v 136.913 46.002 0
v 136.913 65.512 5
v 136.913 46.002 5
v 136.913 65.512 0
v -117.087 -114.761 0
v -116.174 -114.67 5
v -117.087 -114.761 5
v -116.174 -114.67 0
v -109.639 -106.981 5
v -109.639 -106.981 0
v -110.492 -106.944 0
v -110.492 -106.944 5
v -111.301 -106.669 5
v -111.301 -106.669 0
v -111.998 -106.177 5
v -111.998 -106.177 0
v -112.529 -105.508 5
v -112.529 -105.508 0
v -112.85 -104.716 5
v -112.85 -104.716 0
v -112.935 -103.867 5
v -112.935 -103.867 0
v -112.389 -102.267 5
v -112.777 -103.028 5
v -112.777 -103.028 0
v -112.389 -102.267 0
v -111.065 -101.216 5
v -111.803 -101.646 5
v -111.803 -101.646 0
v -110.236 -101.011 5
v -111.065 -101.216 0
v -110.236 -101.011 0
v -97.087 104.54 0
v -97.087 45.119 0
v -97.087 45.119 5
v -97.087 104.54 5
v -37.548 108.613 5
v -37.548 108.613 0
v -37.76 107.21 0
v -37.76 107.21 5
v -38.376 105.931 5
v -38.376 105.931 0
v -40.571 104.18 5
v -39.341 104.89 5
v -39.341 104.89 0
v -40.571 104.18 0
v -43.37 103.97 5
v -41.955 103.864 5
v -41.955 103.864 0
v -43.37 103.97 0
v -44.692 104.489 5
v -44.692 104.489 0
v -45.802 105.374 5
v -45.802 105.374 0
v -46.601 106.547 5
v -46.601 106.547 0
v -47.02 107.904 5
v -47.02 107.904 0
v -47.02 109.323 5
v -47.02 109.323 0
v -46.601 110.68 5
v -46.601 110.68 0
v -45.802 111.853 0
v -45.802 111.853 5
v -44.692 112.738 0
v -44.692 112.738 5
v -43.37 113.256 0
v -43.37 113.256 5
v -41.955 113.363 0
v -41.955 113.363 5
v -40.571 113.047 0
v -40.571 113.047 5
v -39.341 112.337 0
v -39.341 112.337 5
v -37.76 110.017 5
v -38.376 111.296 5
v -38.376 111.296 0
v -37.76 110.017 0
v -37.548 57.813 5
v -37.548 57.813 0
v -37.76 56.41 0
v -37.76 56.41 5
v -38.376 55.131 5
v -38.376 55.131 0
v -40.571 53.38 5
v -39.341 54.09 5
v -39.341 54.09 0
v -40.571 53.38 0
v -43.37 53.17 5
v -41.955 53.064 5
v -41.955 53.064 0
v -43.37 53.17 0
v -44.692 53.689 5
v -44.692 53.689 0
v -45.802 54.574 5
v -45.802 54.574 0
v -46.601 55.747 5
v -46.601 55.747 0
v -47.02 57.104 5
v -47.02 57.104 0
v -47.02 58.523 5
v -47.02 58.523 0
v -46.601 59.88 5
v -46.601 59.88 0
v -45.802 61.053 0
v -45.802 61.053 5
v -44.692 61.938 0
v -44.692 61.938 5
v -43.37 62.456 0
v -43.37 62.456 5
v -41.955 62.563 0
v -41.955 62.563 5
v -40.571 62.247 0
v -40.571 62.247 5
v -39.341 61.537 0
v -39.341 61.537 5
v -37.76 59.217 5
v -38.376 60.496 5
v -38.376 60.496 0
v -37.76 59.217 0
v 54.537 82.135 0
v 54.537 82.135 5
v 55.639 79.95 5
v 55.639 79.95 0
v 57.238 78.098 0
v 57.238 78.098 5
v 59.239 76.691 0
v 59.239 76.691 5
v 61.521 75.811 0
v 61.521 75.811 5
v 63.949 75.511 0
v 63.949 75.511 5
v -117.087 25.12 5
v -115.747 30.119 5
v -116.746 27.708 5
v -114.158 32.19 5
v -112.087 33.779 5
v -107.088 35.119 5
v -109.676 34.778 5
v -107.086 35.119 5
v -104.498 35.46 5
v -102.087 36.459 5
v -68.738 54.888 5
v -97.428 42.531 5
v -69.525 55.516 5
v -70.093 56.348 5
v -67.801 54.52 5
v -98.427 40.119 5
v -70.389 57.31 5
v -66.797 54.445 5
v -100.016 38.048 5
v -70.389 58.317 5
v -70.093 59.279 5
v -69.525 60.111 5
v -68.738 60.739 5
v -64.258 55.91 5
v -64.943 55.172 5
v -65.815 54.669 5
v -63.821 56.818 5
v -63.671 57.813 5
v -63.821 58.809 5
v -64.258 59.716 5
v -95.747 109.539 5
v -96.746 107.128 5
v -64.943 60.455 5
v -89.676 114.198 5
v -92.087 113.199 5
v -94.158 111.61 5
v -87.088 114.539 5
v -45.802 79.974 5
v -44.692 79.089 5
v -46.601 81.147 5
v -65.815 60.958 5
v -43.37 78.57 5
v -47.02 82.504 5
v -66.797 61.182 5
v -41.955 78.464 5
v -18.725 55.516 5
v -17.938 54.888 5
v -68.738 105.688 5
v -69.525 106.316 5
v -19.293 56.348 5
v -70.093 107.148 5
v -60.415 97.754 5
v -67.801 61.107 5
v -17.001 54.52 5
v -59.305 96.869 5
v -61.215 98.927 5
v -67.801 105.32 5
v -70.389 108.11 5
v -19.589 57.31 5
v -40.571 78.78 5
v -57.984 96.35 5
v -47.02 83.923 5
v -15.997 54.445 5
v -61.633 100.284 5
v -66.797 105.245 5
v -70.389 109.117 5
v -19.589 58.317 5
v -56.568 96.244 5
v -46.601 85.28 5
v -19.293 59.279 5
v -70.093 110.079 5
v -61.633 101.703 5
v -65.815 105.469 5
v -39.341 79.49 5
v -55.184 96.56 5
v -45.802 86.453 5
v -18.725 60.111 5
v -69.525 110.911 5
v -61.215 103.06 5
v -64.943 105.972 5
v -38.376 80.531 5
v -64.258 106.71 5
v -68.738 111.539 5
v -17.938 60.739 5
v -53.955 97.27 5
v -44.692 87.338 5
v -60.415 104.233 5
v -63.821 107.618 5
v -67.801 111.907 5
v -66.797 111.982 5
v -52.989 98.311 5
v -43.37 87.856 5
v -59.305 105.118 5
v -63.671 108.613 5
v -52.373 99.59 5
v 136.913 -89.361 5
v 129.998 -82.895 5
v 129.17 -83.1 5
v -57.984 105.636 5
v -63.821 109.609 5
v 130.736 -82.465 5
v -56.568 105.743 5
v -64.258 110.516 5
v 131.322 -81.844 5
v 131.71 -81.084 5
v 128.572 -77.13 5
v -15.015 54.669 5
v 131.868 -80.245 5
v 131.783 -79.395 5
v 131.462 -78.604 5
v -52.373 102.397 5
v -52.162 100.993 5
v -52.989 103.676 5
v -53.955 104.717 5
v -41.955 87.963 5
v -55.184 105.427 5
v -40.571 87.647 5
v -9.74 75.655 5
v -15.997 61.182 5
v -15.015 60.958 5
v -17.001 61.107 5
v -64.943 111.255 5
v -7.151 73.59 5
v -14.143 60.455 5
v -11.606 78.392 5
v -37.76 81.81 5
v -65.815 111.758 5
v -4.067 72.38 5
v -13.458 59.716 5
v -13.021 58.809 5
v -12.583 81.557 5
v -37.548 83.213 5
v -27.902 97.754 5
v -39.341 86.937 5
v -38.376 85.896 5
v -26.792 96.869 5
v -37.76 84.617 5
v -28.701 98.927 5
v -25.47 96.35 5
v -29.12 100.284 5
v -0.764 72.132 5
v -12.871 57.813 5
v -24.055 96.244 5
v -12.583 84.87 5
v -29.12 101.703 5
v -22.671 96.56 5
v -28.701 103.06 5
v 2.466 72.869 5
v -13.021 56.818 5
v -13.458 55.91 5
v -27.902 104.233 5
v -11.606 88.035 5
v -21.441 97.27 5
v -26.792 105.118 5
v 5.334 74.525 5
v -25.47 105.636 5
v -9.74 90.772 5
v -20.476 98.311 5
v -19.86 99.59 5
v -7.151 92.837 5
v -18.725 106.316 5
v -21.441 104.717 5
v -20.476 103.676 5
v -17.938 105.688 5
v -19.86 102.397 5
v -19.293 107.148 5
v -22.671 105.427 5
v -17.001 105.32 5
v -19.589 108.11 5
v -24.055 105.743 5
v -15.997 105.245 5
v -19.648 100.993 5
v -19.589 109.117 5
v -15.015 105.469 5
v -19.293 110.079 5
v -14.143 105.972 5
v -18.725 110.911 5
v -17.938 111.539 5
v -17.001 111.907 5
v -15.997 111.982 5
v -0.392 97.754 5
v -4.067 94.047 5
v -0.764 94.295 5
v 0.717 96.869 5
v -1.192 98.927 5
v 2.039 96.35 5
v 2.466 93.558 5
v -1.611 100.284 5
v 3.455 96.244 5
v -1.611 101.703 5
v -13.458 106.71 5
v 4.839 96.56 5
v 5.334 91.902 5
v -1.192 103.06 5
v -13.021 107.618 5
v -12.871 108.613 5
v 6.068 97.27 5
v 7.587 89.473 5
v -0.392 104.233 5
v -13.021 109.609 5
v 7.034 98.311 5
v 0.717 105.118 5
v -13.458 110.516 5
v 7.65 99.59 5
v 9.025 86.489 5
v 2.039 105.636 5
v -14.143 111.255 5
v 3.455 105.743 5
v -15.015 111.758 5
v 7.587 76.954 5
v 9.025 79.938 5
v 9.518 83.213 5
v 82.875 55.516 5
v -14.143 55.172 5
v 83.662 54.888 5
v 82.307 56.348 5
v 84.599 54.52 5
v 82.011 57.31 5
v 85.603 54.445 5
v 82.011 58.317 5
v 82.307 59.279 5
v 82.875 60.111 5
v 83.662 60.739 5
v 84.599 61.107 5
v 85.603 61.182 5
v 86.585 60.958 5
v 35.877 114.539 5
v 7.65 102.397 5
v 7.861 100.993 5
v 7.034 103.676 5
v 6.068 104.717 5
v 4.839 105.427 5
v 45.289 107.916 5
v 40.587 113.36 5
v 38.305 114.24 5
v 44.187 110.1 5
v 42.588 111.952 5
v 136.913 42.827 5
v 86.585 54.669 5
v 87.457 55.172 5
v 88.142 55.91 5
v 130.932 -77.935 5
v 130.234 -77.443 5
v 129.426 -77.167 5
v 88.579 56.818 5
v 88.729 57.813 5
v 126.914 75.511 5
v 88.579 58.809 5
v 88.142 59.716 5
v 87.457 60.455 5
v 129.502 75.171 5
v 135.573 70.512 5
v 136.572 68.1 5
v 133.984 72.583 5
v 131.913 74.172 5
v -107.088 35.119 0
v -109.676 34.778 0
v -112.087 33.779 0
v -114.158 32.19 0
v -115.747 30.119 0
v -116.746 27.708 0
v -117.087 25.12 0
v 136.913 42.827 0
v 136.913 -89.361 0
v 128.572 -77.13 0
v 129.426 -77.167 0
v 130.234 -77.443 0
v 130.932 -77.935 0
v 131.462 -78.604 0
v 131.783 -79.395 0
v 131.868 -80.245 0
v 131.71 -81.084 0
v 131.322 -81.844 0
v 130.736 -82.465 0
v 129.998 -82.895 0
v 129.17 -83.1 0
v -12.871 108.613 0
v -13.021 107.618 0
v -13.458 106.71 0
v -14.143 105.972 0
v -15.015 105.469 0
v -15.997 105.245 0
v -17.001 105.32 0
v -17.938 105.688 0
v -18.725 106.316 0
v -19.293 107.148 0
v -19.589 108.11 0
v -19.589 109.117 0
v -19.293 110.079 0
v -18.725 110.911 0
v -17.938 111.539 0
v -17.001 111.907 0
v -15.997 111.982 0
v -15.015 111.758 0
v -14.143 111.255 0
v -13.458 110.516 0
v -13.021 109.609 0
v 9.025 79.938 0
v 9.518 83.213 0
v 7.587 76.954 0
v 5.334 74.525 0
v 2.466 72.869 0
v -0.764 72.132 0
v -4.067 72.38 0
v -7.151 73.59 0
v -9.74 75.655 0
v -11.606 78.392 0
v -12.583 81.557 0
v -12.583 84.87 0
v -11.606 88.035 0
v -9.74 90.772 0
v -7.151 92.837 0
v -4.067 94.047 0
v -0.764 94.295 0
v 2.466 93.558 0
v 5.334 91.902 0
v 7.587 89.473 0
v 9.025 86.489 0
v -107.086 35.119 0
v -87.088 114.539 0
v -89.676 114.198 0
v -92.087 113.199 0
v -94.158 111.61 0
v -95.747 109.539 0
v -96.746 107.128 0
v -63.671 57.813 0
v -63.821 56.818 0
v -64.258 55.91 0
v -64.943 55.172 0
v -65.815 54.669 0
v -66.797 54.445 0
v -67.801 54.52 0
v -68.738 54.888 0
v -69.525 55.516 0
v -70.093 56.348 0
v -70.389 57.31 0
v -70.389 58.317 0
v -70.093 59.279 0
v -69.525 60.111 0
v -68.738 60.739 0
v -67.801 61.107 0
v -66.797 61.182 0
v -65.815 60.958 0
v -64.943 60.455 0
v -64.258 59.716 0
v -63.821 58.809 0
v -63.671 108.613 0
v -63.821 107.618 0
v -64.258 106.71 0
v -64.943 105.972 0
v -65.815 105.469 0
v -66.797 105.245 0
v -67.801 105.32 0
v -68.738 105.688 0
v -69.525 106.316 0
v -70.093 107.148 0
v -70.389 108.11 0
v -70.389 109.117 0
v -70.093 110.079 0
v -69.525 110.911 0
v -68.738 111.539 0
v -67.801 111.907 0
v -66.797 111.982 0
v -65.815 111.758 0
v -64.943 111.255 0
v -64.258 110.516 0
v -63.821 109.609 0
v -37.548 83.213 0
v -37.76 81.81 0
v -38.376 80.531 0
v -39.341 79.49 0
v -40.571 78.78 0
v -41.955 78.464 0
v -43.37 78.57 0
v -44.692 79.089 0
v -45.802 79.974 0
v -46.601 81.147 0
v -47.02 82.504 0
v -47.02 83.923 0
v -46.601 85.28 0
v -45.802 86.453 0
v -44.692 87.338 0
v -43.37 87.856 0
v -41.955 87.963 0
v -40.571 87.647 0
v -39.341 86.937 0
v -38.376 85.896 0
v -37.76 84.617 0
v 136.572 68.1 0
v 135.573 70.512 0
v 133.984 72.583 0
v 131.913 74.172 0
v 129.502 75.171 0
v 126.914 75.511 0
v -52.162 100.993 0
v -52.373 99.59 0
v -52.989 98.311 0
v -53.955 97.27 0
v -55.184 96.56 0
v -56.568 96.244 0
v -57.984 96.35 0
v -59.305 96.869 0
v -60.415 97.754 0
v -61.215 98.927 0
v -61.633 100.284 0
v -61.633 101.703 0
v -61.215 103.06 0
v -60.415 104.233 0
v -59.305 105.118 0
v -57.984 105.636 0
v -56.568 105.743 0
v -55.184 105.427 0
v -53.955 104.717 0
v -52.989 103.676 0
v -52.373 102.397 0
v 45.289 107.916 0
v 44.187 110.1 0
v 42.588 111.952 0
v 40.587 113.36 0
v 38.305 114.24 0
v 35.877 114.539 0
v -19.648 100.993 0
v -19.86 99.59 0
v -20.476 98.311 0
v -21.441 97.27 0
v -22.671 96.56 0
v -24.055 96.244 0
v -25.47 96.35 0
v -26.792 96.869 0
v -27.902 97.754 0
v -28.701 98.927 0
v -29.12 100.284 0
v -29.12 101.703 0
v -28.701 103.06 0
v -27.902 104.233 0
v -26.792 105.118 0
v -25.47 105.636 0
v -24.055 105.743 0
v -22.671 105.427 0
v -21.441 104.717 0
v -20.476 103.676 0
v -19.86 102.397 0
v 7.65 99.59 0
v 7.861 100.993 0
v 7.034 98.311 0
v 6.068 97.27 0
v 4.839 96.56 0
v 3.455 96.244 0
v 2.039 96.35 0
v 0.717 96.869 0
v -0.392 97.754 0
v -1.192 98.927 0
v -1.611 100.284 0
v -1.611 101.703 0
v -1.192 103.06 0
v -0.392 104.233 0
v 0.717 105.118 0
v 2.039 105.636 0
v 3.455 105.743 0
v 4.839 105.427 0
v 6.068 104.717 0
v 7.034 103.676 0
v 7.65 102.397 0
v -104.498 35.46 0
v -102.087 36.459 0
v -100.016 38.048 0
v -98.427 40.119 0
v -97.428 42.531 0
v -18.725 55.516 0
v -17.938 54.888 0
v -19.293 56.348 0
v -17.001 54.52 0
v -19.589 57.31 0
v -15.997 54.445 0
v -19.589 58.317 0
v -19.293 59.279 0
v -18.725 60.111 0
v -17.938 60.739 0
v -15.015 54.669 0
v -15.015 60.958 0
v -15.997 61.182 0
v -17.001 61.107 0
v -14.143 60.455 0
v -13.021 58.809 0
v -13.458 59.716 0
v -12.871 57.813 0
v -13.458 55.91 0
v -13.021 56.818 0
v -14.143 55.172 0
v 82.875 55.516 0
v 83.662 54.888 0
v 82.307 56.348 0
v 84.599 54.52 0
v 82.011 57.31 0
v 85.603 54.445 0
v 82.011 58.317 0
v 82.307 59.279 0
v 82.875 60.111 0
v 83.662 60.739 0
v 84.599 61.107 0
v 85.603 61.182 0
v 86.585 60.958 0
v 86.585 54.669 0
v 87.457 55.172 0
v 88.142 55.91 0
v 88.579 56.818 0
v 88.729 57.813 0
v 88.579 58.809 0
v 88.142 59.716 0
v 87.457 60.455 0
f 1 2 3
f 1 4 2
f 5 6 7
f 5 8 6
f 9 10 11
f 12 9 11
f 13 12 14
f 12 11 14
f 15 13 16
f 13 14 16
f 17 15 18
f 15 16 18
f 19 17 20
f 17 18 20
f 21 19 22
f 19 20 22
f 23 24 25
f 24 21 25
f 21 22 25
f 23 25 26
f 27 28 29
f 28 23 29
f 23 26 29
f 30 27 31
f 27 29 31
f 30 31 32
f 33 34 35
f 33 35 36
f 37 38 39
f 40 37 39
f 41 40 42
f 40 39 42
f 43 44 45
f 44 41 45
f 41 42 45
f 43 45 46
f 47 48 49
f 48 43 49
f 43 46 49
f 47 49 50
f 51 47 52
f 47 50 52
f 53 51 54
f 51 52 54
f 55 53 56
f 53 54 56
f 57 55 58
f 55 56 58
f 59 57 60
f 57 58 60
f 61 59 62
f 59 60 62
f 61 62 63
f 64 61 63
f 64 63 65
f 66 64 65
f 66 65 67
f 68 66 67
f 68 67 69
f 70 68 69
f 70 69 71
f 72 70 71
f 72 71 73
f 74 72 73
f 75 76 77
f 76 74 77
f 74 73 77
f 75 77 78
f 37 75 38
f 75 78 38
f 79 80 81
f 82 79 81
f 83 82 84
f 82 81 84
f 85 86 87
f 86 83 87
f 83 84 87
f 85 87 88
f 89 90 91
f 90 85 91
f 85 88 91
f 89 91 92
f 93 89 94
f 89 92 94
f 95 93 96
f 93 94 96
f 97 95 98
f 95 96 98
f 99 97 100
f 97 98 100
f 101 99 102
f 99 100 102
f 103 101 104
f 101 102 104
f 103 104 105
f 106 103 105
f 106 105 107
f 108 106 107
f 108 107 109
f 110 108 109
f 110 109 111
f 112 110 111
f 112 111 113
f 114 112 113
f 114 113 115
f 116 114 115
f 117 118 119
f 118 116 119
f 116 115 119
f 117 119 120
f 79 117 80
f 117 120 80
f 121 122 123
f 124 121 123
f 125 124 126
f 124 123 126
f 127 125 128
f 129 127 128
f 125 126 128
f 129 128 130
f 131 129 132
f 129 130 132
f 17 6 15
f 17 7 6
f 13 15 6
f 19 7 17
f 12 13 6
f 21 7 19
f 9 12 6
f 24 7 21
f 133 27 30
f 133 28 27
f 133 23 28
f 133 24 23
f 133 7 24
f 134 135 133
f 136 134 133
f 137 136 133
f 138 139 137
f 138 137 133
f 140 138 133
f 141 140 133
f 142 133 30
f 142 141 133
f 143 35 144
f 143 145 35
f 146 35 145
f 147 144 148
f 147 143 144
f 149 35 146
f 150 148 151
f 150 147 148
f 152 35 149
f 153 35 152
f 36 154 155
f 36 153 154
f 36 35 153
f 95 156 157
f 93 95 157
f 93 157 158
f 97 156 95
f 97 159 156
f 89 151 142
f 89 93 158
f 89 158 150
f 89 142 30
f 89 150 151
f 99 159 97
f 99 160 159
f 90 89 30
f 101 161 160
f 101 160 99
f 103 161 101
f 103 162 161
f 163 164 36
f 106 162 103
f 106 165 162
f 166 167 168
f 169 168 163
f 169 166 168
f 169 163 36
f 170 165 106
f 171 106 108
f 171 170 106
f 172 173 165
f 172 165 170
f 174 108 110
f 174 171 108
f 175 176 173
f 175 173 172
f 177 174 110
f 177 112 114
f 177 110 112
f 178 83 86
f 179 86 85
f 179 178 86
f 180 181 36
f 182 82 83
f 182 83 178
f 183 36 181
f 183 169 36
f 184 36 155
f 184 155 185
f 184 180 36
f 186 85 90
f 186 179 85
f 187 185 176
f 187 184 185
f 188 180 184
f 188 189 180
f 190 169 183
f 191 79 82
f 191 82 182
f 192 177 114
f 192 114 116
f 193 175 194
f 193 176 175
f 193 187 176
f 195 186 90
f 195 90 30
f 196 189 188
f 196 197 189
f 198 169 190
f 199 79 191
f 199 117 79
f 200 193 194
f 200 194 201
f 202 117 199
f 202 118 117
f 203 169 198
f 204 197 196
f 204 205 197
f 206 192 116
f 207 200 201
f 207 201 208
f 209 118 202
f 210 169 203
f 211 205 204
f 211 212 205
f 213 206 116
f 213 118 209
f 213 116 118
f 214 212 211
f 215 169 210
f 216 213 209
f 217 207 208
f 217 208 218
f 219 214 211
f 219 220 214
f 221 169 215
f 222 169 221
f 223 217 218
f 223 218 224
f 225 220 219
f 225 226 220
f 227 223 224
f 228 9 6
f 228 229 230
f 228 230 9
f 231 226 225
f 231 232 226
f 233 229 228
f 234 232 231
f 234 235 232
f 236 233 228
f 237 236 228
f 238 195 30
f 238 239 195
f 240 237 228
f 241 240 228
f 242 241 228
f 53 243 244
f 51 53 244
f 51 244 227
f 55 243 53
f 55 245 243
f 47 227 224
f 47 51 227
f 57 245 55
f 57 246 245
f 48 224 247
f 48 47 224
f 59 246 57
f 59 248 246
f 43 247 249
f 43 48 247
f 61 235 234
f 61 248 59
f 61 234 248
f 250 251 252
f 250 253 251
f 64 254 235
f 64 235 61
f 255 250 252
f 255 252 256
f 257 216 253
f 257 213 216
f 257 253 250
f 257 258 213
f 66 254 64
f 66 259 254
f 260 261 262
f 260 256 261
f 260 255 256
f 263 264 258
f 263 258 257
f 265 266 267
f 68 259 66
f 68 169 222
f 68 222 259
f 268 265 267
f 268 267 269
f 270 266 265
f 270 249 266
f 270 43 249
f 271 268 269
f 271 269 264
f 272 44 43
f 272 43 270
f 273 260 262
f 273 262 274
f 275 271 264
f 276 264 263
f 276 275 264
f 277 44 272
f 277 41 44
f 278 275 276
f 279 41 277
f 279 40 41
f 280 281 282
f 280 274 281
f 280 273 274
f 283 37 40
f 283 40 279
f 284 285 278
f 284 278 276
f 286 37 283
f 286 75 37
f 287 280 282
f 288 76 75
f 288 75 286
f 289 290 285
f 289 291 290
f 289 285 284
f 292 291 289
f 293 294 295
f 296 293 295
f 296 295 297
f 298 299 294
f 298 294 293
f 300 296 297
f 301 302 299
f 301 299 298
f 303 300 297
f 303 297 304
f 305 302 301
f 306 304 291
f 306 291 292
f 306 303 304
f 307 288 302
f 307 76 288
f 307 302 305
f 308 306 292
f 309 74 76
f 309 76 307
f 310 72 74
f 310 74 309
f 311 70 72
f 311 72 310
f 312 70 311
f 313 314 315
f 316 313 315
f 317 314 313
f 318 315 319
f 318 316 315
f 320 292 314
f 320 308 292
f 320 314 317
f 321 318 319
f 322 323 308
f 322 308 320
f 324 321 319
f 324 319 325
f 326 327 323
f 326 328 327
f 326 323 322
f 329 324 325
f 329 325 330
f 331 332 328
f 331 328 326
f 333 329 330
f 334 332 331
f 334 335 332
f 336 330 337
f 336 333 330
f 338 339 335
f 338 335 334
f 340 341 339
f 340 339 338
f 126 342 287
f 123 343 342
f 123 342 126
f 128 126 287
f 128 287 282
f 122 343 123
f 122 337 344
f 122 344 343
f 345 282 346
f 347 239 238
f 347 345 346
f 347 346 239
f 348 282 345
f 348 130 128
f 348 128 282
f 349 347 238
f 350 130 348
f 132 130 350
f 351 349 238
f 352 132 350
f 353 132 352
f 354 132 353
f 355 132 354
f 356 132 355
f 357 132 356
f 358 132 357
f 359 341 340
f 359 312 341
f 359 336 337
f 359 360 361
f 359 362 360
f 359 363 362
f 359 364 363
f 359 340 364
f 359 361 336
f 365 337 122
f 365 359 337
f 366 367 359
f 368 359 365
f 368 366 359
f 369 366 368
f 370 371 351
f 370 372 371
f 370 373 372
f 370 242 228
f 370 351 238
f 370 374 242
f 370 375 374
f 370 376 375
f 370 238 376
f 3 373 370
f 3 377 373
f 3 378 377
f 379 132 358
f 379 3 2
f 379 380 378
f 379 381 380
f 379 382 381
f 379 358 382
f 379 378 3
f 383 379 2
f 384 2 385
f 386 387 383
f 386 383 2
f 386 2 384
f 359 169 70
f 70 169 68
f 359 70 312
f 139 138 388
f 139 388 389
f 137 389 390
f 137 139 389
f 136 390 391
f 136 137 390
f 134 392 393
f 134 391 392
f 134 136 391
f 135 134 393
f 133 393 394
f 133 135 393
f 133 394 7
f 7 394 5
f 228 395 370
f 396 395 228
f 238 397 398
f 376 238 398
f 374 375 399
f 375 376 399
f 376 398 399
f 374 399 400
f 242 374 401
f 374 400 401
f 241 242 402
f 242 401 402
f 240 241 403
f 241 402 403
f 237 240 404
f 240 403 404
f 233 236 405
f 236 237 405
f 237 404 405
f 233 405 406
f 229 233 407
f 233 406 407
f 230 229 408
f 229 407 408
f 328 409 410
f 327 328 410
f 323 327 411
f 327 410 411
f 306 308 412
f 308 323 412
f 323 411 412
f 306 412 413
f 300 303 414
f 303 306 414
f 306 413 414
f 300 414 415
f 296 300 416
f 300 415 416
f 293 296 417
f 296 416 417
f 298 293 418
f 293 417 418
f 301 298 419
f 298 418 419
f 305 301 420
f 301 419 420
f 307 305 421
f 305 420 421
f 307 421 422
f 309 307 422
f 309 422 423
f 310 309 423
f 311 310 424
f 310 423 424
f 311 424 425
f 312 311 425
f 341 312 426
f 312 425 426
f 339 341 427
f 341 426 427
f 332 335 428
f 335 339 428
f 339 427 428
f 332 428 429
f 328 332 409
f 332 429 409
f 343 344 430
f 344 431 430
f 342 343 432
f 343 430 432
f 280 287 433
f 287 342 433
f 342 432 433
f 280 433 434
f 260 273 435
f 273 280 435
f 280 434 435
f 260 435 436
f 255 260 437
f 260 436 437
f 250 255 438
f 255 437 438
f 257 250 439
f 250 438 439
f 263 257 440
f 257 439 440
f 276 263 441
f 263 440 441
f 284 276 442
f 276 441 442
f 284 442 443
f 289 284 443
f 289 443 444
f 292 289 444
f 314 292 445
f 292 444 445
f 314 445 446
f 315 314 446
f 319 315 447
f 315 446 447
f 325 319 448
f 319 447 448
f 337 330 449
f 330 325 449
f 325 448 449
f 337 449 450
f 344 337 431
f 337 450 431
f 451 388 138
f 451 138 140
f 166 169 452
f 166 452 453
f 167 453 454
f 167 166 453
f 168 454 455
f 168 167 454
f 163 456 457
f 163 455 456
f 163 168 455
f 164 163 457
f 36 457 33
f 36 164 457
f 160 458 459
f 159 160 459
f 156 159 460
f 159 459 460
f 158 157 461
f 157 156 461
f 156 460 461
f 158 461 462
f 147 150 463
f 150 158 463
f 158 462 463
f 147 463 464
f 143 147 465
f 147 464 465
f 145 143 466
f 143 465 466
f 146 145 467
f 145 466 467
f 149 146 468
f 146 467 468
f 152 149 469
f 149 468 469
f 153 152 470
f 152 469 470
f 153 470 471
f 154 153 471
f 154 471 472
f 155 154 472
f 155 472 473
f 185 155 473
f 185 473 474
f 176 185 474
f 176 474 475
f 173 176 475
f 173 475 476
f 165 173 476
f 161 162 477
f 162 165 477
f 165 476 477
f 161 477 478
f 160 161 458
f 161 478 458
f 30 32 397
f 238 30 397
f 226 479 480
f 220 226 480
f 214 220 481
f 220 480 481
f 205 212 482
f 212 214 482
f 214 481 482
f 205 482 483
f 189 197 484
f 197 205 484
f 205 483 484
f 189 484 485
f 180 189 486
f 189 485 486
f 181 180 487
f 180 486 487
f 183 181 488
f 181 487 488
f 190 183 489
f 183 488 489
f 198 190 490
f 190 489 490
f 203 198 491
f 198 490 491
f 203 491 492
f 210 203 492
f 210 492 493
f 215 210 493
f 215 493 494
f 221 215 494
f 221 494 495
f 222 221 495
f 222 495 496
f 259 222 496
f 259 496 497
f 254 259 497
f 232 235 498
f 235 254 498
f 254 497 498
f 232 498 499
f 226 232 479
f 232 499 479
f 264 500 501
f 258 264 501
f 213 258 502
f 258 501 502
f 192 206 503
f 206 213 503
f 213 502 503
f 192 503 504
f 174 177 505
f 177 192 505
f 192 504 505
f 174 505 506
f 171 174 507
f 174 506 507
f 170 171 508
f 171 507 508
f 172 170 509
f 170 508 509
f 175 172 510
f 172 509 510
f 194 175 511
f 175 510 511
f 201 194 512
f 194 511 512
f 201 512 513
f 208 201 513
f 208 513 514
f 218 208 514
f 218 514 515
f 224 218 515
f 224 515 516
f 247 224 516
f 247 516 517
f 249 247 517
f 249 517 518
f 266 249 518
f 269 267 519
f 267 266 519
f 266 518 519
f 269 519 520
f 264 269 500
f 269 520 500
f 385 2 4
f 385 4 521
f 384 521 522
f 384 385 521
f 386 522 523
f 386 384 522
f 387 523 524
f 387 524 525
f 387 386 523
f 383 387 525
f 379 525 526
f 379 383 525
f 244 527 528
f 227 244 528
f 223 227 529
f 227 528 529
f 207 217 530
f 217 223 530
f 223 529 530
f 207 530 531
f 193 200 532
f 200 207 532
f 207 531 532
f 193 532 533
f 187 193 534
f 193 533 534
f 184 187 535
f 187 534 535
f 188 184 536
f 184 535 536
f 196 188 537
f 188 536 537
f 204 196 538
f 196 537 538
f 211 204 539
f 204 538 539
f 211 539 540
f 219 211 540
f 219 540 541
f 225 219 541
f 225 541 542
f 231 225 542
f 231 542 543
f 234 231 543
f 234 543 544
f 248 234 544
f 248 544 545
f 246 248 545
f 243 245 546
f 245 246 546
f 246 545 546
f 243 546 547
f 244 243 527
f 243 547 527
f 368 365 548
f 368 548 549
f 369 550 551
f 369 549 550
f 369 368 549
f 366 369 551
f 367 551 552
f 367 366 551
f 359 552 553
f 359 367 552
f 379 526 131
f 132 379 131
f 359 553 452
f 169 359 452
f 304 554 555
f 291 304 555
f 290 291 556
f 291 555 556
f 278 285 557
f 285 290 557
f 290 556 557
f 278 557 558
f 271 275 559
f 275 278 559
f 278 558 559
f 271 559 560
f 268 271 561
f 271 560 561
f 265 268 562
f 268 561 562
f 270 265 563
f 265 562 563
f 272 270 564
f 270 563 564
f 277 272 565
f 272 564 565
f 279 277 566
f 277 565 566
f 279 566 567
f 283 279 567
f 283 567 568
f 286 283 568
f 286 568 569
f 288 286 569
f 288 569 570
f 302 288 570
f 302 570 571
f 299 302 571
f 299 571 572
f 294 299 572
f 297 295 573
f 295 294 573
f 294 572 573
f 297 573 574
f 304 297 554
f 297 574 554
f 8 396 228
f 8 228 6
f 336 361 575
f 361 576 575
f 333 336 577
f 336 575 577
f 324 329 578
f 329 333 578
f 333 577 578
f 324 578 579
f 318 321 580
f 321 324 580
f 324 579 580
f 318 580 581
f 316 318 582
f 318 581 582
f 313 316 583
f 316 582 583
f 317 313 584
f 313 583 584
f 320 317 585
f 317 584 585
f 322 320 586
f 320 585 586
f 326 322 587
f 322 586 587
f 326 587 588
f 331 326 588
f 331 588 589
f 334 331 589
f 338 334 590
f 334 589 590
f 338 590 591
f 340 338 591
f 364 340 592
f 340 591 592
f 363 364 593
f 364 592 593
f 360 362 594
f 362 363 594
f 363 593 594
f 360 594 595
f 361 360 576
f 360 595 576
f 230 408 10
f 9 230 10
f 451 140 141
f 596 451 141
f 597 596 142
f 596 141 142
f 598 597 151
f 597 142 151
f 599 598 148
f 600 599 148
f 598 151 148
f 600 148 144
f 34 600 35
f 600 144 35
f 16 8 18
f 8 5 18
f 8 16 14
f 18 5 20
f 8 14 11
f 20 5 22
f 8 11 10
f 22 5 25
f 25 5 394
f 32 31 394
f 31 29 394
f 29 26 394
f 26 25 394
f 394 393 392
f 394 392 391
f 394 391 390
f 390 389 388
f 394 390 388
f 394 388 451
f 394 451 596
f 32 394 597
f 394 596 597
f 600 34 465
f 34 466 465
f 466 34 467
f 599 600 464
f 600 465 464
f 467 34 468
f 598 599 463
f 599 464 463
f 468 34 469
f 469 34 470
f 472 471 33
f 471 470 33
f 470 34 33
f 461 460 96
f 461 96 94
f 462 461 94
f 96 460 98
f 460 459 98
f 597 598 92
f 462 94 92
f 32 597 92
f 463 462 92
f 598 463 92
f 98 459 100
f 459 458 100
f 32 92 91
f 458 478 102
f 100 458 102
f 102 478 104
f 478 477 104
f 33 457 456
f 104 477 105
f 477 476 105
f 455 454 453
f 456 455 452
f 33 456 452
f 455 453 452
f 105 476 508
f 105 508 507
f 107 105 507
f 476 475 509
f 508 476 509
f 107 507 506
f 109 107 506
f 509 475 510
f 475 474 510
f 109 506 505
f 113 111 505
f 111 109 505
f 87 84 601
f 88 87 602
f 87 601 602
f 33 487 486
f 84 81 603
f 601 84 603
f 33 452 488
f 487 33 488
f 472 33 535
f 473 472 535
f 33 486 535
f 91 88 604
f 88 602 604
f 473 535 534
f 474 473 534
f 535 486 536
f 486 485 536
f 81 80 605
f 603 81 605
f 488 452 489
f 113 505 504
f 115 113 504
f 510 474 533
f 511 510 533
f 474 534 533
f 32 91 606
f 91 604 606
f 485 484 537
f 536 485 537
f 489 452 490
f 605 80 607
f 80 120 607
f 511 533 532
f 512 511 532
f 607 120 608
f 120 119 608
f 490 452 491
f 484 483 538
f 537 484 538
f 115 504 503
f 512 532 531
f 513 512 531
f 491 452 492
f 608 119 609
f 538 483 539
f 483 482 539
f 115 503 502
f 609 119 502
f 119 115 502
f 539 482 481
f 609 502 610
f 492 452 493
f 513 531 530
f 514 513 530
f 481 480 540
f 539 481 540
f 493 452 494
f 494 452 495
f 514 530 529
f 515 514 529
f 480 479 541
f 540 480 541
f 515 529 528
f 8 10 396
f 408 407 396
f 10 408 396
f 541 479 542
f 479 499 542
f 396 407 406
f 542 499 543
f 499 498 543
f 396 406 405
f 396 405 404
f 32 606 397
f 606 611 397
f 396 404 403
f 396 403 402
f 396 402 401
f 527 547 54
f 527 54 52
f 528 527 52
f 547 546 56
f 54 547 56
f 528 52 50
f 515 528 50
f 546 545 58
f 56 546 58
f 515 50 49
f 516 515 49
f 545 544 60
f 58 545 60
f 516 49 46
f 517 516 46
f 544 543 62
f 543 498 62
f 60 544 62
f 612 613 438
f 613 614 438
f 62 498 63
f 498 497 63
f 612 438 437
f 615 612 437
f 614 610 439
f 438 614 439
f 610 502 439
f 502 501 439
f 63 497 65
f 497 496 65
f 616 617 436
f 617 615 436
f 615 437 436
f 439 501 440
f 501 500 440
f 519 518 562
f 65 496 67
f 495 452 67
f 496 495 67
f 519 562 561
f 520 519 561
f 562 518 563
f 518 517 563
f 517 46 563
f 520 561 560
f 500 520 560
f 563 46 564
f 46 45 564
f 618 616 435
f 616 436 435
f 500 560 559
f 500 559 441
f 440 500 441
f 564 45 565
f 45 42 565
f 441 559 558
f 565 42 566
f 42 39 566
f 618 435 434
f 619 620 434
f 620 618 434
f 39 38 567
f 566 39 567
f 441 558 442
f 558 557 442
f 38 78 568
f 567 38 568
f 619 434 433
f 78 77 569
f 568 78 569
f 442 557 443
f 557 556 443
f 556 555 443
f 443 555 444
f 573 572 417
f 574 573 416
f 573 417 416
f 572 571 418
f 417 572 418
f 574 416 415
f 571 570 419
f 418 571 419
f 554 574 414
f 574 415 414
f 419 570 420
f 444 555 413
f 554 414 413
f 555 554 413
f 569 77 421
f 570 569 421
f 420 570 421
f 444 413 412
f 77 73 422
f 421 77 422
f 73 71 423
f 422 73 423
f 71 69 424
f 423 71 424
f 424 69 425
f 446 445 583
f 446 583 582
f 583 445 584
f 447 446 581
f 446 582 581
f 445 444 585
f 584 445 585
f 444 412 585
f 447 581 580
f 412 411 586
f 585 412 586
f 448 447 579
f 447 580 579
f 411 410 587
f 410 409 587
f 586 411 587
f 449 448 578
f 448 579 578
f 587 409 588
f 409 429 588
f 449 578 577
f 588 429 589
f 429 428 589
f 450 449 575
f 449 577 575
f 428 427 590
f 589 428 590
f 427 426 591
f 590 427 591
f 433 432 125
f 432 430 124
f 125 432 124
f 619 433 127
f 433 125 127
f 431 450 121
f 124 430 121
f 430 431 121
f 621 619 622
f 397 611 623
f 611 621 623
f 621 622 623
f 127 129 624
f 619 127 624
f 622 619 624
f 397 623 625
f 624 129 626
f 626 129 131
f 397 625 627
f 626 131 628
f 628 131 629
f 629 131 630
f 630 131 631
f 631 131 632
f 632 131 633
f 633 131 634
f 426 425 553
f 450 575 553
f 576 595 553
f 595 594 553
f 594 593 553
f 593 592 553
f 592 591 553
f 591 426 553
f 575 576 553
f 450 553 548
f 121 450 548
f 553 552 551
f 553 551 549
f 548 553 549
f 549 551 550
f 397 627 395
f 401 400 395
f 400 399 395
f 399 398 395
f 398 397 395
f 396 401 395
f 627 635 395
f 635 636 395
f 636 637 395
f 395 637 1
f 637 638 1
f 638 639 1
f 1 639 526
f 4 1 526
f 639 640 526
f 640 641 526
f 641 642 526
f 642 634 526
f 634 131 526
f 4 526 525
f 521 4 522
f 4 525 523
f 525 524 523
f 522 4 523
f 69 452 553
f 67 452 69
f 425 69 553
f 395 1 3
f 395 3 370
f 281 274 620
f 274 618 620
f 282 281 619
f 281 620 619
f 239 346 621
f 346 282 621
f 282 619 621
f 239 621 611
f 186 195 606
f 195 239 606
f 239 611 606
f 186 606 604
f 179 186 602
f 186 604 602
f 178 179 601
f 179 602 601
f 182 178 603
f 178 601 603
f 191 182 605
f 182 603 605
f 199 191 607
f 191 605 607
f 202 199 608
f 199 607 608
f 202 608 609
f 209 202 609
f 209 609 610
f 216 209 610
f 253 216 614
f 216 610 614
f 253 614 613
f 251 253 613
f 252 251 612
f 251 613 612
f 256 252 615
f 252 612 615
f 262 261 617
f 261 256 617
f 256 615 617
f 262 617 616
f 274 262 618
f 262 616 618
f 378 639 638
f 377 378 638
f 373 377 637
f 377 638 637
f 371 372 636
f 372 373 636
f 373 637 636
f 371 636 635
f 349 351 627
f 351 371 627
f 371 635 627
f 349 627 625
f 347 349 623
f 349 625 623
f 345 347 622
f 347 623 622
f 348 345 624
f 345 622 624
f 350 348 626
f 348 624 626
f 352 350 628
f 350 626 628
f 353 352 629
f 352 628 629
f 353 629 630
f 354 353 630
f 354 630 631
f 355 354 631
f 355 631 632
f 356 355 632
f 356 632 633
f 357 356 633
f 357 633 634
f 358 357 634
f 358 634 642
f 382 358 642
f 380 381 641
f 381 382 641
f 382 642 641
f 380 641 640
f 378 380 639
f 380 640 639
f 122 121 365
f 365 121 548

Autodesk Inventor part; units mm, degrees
ref_plane "YZ Plane" through (0, 0, 0) normal (1, 0, 0) x (0, 1, 0)
ref_plane "XZ Plane" through (0, 0, 0) normal (0, 1, 0) x (-1, 0, 0)
ref_plane "XY Plane" through (0, 0, 0) normal (0, 0, 1) x (1, 0, 0)
sketch "Esboço1" plane through (0, 0, 0) normal (0, 0, 1) x (1, 0, 0)
  line L0 (136.913, 75.5114) -> (56.913, 75.5114)
  line L1 (56.913, 75.5114) -> (42.913, 114.5391)
  line L2 (42.913, 114.5391) -> (-117.087, 114.5391)
  line L3 (-117.087, 114.5391) -> (-117.087, -114.7608)
  line L4 (136.913, 75.5114) -> (136.913, -89.3608)
  line L5 (136.913, -89.3608) -> (-117.087, -114.7608)
  line L6 (136.913, 46.0024) -> (136.913, 42.8274)
  line L7 (-116.1736, -114.6695) -> (137.8264, -89.2695)
  circle A0 centre (85.351, 57.8134) radius 3.3782
  circle A1 centre (-42.3105, 57.8134) radius 4.7625
  circle A2 centre (-42.3105, 83.2134) radius 4.7625
  circle A3 centre (-56.9241, 100.9934) radius 4.7625
  circle A4 centre (-24.4105, 100.9934) radius 4.7625
  circle A5 centre (-42.3105, 108.6134) radius 4.7625
  circle A6 centre (-67.049, 57.8134) radius 3.3782
  circle A7 centre (-1.5943, 83.2134) radius 11.1125
  circle A8 centre (-16.249, 57.8134) radius 3.3782
  circle A9 centre (3.0987, 100.9934) radius 4.7625
  circle A10 centre (-16.249, 108.6134) radius 3.3782
  circle A11 centre (-67.049, 108.6134) radius 3.3782
  circle A12 centre (-117.849, 57.8134) radius 6.096
  line L8 (129.1695, -83.1003) -> (-109.6394, -106.9812)
  arc A13 (129.1695, -83.1003) -> (128.5725, -77.1301) centre (128.871, -80.1152) ccw
  line L9 (-110.2364, -101.011) -> (128.5725, -77.1301)
  arc A14 (-110.2364, -101.011) -> (-109.6394, -106.9812) centre (-109.9379, -103.9961) ccw
  line L10 (-97.087, 114.5391) -> (-117.087, 114.5391)
  line L11 (-117.087, 114.5391) -> (-117.087, 35.1191)
  line L12 (-117.087, 35.1191) -> (-97.087, 35.1191)
  line L13 (-97.087, 35.1191) -> (-97.087, 114.5391)
  point P0 (0, 0)
  point P1 (-117.087, 63.8616)
  point P2 (-117.087, 51.7652)
  dimension "d0" = 254
  dimension "d1" = 80
  dimension "d2" = 160
  dimension "d3" = 109.734
  dimension "d6" = 20
extrude "Extrusão1" add sketch "Esboço1" along normal blind 5 contours L4 L5 L3 L12 L13 L2 L1 L0
fillet "Arredondamento1" radius 10 6 edges at (-97.087, 35.1191, 2.5) (-117.087, 35.1191, 2.5) (-97.087, 114.5391, 2.5) (42.913, 114.5391, 2.5) (56.913, 75.5114, 2.5) (136.913, 75.5114, 2.5)
properties part number "CHAPA FIXAÇÃO DIREITA 1"
